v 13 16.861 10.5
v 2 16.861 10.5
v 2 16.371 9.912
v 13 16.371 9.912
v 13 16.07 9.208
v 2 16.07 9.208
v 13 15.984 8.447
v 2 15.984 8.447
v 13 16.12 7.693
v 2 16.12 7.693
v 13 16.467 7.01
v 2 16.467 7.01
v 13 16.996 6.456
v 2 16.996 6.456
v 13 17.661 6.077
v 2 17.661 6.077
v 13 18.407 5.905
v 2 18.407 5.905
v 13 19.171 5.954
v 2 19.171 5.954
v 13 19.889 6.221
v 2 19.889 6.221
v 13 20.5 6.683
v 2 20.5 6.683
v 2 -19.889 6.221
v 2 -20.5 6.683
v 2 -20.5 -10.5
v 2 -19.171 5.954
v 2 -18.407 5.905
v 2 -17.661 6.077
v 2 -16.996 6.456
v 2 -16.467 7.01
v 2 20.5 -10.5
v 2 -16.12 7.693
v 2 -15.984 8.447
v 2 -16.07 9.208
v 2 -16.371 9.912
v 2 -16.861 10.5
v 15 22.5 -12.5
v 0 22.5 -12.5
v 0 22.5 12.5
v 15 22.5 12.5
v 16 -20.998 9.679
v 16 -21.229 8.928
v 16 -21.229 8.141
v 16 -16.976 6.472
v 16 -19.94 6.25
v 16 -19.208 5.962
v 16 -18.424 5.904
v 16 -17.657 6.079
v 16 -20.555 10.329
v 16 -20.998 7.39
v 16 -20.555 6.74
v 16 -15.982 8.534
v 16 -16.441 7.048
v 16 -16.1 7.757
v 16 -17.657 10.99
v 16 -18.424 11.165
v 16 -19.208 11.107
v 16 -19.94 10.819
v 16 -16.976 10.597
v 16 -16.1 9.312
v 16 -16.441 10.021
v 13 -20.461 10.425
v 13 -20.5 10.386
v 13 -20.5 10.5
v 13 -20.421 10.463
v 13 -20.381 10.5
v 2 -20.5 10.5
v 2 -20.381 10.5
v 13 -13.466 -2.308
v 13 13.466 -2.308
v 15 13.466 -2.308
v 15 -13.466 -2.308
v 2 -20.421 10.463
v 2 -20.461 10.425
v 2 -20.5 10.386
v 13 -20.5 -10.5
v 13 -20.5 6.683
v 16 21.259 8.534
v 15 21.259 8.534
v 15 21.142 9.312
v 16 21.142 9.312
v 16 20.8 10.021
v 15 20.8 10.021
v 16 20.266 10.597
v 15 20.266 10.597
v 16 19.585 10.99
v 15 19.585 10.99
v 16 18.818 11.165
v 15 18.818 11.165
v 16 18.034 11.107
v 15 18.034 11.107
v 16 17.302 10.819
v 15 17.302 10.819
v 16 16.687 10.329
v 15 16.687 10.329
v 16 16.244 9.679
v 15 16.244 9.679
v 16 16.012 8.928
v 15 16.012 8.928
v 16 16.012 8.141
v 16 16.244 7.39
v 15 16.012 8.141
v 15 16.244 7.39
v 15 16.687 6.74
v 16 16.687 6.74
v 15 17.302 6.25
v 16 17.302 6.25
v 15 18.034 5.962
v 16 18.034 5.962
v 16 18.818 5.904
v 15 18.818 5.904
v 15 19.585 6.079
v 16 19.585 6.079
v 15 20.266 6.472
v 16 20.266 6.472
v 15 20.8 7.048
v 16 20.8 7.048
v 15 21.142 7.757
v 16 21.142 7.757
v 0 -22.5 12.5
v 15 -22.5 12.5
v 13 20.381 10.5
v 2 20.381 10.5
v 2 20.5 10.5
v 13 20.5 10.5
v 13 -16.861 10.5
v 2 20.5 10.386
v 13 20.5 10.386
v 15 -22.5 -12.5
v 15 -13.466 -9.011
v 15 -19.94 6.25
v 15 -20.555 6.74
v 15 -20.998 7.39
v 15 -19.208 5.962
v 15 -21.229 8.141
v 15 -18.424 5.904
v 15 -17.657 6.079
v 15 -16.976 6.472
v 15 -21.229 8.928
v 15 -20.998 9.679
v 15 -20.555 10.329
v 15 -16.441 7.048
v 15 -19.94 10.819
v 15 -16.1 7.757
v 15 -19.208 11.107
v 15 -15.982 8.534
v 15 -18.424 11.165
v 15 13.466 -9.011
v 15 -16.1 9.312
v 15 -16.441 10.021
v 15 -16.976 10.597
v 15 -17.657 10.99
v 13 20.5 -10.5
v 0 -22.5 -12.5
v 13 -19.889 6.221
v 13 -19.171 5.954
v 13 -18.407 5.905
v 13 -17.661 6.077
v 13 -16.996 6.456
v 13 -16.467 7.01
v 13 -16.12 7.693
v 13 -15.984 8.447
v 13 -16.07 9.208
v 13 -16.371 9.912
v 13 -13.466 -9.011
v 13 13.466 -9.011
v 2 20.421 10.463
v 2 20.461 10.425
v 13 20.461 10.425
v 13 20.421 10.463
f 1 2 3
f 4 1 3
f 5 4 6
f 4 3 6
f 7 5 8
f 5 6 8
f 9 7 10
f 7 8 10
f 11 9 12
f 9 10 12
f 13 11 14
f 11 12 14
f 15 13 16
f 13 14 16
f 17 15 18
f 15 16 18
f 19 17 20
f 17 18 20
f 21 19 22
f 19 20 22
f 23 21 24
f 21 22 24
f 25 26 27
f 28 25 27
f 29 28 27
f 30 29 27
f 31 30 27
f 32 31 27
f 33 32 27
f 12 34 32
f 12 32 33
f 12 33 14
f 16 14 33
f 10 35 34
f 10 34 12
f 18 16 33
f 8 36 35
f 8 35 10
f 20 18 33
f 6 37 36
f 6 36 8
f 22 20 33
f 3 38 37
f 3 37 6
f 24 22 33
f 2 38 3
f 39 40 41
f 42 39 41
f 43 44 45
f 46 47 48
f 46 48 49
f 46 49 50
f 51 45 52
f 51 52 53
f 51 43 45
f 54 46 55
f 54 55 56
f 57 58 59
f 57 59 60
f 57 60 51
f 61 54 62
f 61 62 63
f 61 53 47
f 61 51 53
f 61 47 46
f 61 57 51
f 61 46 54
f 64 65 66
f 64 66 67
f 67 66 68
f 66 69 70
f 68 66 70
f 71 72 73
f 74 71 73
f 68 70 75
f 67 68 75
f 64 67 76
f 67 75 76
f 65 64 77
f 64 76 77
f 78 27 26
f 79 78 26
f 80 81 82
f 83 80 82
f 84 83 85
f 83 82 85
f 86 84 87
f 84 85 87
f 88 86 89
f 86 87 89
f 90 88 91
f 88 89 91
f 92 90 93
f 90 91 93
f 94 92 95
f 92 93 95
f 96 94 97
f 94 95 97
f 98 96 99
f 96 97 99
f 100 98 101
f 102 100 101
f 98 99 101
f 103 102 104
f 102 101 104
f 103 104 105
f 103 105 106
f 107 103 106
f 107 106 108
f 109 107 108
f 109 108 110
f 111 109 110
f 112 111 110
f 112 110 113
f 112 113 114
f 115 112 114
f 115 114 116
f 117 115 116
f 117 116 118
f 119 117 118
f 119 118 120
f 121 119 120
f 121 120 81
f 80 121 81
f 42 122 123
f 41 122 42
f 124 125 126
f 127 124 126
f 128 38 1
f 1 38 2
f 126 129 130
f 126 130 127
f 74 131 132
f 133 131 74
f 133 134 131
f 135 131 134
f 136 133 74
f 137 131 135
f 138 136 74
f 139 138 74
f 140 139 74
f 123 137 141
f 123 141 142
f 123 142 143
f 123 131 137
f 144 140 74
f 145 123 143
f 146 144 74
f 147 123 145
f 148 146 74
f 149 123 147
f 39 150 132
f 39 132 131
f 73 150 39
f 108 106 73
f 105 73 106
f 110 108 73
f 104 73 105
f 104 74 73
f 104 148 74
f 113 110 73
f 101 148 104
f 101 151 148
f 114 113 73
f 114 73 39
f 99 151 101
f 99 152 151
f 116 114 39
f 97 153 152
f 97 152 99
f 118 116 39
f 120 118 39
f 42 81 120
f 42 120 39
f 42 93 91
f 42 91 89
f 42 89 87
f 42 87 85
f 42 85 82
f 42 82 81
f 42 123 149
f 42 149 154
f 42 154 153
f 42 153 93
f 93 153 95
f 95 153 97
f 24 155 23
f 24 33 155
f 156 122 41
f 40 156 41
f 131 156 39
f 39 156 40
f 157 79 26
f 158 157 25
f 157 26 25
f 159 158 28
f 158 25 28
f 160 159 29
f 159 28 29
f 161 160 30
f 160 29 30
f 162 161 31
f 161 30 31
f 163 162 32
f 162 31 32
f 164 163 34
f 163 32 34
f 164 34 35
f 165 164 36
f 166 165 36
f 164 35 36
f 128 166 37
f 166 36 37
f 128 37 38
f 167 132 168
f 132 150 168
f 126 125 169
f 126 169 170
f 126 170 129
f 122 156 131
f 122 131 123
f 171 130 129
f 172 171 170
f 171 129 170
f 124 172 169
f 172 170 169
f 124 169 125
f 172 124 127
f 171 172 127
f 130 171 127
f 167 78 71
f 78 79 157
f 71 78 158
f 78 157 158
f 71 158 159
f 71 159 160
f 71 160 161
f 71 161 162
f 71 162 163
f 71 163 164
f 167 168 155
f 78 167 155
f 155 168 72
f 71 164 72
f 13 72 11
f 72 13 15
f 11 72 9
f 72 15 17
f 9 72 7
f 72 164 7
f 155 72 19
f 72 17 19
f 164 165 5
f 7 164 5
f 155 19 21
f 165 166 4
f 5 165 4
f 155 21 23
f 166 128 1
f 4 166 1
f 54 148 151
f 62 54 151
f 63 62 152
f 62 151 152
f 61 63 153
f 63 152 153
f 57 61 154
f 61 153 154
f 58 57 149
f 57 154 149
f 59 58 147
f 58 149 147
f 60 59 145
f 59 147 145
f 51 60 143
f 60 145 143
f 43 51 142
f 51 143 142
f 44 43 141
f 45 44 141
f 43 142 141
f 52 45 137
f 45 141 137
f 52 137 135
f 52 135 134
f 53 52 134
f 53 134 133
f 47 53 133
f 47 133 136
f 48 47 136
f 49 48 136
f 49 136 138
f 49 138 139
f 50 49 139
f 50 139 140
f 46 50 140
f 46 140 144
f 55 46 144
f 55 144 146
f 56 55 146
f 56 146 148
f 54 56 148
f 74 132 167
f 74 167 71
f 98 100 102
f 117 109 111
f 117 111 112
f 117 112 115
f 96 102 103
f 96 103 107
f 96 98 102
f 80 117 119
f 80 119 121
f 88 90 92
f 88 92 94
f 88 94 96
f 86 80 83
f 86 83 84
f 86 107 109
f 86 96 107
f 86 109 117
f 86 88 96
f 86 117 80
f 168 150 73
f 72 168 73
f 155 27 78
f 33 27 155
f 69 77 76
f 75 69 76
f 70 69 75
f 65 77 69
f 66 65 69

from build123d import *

# Parameters (mm, degrees)
F0_W     = 45
F0_H     = 25
F1_DEPTH = 15
F2_W     = 3.8793105632
F2_H     = 6.7036496475
F2_W_2   = 5.8189658448
F2_W_3   = 7.5361132622
F3_DEPTH = 25
F4_T     = 2
F5_R     = 2.6382169245
F6_DEPTH = 5
F7_DEPTH = 16


# Not quite as in the source:
# - a shell that OpenCascade refuses in one call is made with other operations: the cavity is built on its own and cut out


with BuildPart() as f1:
    # F0 (on Right) → F1 (new body)
    with BuildSketch(Plane.YZ):
        Rectangle(F0_W, F0_H)
    extrude(amount=F1_DEPTH)

    # F2 (on Right) → F3 (join)
    with BuildSketch(Plane.YZ):
        with Locations((-11.5266777575, -5.6595918722)):
            Rectangle(F2_W, F2_H)
        with Locations((-6.6775395535, -5.6595918722)):
            Rectangle(F2_W_2, F2_H)
        with Locations((0, -5.6595918722)):
            Rectangle(F2_W_3, F2_H)
        with Locations((6.6775395535, -5.6595918722)):
            Rectangle(F2_W_2, F2_H)
        with Locations((11.5266777575, -5.6595918722)):
            Rectangle(F2_W, F2_H)
    extrude(amount=F3_DEPTH)

    # F4: shell of thickness 2, made by hand


with BuildPart() as f4_core1:
    # F4_t2: copy of F1
    add(f1.part)

    # the walls: a layer under each face that stays
    f4_faces = [f4_core1.faces().sort_by_distance(p)[0] for p in [
        (7.5, -22.5, 0),
        (7.5, 0, 12.5),
        (7.5, 0, -12.5),
        (0, 0, 0),
        (15, 0, 0),
        (7.5, 22.5, 0),
    ]]
    thicken(f4_faces, amount=-F4_T, mode=Mode.SUBTRACT)


with BuildPart() as f1_1:
    add(f1.part)

    # what is left inside the walls is the cavity
    f4_cavity = [f4_core1.part.solids().sort_by_distance(p)[0] for p in [
        (2.02, 0, -3.5),
    ]]
    add(f4_cavity, mode=Mode.SUBTRACT)

    # F5 (on Right) → F6 (join)
    with BuildSketch(Plane.YZ):
        with Locations((-18.6206903309, 8.5344836116)):
            Circle(F5_R)
        with Locations((18.6206903309, 8.5344836116)):
            Circle(F5_R)
    extrude(amount=F6_DEPTH)

    # F5 (on Right) → F7 (join)
    with BuildSketch(Plane.YZ):
        with Locations((-18.6206903309, 8.5344836116)):
            Circle(F5_R)
        with Locations((18.6206903309, 8.5344836116)):
            Circle(F5_R)
    extrude(amount=F7_DEPTH)


solid = f1_1.part
